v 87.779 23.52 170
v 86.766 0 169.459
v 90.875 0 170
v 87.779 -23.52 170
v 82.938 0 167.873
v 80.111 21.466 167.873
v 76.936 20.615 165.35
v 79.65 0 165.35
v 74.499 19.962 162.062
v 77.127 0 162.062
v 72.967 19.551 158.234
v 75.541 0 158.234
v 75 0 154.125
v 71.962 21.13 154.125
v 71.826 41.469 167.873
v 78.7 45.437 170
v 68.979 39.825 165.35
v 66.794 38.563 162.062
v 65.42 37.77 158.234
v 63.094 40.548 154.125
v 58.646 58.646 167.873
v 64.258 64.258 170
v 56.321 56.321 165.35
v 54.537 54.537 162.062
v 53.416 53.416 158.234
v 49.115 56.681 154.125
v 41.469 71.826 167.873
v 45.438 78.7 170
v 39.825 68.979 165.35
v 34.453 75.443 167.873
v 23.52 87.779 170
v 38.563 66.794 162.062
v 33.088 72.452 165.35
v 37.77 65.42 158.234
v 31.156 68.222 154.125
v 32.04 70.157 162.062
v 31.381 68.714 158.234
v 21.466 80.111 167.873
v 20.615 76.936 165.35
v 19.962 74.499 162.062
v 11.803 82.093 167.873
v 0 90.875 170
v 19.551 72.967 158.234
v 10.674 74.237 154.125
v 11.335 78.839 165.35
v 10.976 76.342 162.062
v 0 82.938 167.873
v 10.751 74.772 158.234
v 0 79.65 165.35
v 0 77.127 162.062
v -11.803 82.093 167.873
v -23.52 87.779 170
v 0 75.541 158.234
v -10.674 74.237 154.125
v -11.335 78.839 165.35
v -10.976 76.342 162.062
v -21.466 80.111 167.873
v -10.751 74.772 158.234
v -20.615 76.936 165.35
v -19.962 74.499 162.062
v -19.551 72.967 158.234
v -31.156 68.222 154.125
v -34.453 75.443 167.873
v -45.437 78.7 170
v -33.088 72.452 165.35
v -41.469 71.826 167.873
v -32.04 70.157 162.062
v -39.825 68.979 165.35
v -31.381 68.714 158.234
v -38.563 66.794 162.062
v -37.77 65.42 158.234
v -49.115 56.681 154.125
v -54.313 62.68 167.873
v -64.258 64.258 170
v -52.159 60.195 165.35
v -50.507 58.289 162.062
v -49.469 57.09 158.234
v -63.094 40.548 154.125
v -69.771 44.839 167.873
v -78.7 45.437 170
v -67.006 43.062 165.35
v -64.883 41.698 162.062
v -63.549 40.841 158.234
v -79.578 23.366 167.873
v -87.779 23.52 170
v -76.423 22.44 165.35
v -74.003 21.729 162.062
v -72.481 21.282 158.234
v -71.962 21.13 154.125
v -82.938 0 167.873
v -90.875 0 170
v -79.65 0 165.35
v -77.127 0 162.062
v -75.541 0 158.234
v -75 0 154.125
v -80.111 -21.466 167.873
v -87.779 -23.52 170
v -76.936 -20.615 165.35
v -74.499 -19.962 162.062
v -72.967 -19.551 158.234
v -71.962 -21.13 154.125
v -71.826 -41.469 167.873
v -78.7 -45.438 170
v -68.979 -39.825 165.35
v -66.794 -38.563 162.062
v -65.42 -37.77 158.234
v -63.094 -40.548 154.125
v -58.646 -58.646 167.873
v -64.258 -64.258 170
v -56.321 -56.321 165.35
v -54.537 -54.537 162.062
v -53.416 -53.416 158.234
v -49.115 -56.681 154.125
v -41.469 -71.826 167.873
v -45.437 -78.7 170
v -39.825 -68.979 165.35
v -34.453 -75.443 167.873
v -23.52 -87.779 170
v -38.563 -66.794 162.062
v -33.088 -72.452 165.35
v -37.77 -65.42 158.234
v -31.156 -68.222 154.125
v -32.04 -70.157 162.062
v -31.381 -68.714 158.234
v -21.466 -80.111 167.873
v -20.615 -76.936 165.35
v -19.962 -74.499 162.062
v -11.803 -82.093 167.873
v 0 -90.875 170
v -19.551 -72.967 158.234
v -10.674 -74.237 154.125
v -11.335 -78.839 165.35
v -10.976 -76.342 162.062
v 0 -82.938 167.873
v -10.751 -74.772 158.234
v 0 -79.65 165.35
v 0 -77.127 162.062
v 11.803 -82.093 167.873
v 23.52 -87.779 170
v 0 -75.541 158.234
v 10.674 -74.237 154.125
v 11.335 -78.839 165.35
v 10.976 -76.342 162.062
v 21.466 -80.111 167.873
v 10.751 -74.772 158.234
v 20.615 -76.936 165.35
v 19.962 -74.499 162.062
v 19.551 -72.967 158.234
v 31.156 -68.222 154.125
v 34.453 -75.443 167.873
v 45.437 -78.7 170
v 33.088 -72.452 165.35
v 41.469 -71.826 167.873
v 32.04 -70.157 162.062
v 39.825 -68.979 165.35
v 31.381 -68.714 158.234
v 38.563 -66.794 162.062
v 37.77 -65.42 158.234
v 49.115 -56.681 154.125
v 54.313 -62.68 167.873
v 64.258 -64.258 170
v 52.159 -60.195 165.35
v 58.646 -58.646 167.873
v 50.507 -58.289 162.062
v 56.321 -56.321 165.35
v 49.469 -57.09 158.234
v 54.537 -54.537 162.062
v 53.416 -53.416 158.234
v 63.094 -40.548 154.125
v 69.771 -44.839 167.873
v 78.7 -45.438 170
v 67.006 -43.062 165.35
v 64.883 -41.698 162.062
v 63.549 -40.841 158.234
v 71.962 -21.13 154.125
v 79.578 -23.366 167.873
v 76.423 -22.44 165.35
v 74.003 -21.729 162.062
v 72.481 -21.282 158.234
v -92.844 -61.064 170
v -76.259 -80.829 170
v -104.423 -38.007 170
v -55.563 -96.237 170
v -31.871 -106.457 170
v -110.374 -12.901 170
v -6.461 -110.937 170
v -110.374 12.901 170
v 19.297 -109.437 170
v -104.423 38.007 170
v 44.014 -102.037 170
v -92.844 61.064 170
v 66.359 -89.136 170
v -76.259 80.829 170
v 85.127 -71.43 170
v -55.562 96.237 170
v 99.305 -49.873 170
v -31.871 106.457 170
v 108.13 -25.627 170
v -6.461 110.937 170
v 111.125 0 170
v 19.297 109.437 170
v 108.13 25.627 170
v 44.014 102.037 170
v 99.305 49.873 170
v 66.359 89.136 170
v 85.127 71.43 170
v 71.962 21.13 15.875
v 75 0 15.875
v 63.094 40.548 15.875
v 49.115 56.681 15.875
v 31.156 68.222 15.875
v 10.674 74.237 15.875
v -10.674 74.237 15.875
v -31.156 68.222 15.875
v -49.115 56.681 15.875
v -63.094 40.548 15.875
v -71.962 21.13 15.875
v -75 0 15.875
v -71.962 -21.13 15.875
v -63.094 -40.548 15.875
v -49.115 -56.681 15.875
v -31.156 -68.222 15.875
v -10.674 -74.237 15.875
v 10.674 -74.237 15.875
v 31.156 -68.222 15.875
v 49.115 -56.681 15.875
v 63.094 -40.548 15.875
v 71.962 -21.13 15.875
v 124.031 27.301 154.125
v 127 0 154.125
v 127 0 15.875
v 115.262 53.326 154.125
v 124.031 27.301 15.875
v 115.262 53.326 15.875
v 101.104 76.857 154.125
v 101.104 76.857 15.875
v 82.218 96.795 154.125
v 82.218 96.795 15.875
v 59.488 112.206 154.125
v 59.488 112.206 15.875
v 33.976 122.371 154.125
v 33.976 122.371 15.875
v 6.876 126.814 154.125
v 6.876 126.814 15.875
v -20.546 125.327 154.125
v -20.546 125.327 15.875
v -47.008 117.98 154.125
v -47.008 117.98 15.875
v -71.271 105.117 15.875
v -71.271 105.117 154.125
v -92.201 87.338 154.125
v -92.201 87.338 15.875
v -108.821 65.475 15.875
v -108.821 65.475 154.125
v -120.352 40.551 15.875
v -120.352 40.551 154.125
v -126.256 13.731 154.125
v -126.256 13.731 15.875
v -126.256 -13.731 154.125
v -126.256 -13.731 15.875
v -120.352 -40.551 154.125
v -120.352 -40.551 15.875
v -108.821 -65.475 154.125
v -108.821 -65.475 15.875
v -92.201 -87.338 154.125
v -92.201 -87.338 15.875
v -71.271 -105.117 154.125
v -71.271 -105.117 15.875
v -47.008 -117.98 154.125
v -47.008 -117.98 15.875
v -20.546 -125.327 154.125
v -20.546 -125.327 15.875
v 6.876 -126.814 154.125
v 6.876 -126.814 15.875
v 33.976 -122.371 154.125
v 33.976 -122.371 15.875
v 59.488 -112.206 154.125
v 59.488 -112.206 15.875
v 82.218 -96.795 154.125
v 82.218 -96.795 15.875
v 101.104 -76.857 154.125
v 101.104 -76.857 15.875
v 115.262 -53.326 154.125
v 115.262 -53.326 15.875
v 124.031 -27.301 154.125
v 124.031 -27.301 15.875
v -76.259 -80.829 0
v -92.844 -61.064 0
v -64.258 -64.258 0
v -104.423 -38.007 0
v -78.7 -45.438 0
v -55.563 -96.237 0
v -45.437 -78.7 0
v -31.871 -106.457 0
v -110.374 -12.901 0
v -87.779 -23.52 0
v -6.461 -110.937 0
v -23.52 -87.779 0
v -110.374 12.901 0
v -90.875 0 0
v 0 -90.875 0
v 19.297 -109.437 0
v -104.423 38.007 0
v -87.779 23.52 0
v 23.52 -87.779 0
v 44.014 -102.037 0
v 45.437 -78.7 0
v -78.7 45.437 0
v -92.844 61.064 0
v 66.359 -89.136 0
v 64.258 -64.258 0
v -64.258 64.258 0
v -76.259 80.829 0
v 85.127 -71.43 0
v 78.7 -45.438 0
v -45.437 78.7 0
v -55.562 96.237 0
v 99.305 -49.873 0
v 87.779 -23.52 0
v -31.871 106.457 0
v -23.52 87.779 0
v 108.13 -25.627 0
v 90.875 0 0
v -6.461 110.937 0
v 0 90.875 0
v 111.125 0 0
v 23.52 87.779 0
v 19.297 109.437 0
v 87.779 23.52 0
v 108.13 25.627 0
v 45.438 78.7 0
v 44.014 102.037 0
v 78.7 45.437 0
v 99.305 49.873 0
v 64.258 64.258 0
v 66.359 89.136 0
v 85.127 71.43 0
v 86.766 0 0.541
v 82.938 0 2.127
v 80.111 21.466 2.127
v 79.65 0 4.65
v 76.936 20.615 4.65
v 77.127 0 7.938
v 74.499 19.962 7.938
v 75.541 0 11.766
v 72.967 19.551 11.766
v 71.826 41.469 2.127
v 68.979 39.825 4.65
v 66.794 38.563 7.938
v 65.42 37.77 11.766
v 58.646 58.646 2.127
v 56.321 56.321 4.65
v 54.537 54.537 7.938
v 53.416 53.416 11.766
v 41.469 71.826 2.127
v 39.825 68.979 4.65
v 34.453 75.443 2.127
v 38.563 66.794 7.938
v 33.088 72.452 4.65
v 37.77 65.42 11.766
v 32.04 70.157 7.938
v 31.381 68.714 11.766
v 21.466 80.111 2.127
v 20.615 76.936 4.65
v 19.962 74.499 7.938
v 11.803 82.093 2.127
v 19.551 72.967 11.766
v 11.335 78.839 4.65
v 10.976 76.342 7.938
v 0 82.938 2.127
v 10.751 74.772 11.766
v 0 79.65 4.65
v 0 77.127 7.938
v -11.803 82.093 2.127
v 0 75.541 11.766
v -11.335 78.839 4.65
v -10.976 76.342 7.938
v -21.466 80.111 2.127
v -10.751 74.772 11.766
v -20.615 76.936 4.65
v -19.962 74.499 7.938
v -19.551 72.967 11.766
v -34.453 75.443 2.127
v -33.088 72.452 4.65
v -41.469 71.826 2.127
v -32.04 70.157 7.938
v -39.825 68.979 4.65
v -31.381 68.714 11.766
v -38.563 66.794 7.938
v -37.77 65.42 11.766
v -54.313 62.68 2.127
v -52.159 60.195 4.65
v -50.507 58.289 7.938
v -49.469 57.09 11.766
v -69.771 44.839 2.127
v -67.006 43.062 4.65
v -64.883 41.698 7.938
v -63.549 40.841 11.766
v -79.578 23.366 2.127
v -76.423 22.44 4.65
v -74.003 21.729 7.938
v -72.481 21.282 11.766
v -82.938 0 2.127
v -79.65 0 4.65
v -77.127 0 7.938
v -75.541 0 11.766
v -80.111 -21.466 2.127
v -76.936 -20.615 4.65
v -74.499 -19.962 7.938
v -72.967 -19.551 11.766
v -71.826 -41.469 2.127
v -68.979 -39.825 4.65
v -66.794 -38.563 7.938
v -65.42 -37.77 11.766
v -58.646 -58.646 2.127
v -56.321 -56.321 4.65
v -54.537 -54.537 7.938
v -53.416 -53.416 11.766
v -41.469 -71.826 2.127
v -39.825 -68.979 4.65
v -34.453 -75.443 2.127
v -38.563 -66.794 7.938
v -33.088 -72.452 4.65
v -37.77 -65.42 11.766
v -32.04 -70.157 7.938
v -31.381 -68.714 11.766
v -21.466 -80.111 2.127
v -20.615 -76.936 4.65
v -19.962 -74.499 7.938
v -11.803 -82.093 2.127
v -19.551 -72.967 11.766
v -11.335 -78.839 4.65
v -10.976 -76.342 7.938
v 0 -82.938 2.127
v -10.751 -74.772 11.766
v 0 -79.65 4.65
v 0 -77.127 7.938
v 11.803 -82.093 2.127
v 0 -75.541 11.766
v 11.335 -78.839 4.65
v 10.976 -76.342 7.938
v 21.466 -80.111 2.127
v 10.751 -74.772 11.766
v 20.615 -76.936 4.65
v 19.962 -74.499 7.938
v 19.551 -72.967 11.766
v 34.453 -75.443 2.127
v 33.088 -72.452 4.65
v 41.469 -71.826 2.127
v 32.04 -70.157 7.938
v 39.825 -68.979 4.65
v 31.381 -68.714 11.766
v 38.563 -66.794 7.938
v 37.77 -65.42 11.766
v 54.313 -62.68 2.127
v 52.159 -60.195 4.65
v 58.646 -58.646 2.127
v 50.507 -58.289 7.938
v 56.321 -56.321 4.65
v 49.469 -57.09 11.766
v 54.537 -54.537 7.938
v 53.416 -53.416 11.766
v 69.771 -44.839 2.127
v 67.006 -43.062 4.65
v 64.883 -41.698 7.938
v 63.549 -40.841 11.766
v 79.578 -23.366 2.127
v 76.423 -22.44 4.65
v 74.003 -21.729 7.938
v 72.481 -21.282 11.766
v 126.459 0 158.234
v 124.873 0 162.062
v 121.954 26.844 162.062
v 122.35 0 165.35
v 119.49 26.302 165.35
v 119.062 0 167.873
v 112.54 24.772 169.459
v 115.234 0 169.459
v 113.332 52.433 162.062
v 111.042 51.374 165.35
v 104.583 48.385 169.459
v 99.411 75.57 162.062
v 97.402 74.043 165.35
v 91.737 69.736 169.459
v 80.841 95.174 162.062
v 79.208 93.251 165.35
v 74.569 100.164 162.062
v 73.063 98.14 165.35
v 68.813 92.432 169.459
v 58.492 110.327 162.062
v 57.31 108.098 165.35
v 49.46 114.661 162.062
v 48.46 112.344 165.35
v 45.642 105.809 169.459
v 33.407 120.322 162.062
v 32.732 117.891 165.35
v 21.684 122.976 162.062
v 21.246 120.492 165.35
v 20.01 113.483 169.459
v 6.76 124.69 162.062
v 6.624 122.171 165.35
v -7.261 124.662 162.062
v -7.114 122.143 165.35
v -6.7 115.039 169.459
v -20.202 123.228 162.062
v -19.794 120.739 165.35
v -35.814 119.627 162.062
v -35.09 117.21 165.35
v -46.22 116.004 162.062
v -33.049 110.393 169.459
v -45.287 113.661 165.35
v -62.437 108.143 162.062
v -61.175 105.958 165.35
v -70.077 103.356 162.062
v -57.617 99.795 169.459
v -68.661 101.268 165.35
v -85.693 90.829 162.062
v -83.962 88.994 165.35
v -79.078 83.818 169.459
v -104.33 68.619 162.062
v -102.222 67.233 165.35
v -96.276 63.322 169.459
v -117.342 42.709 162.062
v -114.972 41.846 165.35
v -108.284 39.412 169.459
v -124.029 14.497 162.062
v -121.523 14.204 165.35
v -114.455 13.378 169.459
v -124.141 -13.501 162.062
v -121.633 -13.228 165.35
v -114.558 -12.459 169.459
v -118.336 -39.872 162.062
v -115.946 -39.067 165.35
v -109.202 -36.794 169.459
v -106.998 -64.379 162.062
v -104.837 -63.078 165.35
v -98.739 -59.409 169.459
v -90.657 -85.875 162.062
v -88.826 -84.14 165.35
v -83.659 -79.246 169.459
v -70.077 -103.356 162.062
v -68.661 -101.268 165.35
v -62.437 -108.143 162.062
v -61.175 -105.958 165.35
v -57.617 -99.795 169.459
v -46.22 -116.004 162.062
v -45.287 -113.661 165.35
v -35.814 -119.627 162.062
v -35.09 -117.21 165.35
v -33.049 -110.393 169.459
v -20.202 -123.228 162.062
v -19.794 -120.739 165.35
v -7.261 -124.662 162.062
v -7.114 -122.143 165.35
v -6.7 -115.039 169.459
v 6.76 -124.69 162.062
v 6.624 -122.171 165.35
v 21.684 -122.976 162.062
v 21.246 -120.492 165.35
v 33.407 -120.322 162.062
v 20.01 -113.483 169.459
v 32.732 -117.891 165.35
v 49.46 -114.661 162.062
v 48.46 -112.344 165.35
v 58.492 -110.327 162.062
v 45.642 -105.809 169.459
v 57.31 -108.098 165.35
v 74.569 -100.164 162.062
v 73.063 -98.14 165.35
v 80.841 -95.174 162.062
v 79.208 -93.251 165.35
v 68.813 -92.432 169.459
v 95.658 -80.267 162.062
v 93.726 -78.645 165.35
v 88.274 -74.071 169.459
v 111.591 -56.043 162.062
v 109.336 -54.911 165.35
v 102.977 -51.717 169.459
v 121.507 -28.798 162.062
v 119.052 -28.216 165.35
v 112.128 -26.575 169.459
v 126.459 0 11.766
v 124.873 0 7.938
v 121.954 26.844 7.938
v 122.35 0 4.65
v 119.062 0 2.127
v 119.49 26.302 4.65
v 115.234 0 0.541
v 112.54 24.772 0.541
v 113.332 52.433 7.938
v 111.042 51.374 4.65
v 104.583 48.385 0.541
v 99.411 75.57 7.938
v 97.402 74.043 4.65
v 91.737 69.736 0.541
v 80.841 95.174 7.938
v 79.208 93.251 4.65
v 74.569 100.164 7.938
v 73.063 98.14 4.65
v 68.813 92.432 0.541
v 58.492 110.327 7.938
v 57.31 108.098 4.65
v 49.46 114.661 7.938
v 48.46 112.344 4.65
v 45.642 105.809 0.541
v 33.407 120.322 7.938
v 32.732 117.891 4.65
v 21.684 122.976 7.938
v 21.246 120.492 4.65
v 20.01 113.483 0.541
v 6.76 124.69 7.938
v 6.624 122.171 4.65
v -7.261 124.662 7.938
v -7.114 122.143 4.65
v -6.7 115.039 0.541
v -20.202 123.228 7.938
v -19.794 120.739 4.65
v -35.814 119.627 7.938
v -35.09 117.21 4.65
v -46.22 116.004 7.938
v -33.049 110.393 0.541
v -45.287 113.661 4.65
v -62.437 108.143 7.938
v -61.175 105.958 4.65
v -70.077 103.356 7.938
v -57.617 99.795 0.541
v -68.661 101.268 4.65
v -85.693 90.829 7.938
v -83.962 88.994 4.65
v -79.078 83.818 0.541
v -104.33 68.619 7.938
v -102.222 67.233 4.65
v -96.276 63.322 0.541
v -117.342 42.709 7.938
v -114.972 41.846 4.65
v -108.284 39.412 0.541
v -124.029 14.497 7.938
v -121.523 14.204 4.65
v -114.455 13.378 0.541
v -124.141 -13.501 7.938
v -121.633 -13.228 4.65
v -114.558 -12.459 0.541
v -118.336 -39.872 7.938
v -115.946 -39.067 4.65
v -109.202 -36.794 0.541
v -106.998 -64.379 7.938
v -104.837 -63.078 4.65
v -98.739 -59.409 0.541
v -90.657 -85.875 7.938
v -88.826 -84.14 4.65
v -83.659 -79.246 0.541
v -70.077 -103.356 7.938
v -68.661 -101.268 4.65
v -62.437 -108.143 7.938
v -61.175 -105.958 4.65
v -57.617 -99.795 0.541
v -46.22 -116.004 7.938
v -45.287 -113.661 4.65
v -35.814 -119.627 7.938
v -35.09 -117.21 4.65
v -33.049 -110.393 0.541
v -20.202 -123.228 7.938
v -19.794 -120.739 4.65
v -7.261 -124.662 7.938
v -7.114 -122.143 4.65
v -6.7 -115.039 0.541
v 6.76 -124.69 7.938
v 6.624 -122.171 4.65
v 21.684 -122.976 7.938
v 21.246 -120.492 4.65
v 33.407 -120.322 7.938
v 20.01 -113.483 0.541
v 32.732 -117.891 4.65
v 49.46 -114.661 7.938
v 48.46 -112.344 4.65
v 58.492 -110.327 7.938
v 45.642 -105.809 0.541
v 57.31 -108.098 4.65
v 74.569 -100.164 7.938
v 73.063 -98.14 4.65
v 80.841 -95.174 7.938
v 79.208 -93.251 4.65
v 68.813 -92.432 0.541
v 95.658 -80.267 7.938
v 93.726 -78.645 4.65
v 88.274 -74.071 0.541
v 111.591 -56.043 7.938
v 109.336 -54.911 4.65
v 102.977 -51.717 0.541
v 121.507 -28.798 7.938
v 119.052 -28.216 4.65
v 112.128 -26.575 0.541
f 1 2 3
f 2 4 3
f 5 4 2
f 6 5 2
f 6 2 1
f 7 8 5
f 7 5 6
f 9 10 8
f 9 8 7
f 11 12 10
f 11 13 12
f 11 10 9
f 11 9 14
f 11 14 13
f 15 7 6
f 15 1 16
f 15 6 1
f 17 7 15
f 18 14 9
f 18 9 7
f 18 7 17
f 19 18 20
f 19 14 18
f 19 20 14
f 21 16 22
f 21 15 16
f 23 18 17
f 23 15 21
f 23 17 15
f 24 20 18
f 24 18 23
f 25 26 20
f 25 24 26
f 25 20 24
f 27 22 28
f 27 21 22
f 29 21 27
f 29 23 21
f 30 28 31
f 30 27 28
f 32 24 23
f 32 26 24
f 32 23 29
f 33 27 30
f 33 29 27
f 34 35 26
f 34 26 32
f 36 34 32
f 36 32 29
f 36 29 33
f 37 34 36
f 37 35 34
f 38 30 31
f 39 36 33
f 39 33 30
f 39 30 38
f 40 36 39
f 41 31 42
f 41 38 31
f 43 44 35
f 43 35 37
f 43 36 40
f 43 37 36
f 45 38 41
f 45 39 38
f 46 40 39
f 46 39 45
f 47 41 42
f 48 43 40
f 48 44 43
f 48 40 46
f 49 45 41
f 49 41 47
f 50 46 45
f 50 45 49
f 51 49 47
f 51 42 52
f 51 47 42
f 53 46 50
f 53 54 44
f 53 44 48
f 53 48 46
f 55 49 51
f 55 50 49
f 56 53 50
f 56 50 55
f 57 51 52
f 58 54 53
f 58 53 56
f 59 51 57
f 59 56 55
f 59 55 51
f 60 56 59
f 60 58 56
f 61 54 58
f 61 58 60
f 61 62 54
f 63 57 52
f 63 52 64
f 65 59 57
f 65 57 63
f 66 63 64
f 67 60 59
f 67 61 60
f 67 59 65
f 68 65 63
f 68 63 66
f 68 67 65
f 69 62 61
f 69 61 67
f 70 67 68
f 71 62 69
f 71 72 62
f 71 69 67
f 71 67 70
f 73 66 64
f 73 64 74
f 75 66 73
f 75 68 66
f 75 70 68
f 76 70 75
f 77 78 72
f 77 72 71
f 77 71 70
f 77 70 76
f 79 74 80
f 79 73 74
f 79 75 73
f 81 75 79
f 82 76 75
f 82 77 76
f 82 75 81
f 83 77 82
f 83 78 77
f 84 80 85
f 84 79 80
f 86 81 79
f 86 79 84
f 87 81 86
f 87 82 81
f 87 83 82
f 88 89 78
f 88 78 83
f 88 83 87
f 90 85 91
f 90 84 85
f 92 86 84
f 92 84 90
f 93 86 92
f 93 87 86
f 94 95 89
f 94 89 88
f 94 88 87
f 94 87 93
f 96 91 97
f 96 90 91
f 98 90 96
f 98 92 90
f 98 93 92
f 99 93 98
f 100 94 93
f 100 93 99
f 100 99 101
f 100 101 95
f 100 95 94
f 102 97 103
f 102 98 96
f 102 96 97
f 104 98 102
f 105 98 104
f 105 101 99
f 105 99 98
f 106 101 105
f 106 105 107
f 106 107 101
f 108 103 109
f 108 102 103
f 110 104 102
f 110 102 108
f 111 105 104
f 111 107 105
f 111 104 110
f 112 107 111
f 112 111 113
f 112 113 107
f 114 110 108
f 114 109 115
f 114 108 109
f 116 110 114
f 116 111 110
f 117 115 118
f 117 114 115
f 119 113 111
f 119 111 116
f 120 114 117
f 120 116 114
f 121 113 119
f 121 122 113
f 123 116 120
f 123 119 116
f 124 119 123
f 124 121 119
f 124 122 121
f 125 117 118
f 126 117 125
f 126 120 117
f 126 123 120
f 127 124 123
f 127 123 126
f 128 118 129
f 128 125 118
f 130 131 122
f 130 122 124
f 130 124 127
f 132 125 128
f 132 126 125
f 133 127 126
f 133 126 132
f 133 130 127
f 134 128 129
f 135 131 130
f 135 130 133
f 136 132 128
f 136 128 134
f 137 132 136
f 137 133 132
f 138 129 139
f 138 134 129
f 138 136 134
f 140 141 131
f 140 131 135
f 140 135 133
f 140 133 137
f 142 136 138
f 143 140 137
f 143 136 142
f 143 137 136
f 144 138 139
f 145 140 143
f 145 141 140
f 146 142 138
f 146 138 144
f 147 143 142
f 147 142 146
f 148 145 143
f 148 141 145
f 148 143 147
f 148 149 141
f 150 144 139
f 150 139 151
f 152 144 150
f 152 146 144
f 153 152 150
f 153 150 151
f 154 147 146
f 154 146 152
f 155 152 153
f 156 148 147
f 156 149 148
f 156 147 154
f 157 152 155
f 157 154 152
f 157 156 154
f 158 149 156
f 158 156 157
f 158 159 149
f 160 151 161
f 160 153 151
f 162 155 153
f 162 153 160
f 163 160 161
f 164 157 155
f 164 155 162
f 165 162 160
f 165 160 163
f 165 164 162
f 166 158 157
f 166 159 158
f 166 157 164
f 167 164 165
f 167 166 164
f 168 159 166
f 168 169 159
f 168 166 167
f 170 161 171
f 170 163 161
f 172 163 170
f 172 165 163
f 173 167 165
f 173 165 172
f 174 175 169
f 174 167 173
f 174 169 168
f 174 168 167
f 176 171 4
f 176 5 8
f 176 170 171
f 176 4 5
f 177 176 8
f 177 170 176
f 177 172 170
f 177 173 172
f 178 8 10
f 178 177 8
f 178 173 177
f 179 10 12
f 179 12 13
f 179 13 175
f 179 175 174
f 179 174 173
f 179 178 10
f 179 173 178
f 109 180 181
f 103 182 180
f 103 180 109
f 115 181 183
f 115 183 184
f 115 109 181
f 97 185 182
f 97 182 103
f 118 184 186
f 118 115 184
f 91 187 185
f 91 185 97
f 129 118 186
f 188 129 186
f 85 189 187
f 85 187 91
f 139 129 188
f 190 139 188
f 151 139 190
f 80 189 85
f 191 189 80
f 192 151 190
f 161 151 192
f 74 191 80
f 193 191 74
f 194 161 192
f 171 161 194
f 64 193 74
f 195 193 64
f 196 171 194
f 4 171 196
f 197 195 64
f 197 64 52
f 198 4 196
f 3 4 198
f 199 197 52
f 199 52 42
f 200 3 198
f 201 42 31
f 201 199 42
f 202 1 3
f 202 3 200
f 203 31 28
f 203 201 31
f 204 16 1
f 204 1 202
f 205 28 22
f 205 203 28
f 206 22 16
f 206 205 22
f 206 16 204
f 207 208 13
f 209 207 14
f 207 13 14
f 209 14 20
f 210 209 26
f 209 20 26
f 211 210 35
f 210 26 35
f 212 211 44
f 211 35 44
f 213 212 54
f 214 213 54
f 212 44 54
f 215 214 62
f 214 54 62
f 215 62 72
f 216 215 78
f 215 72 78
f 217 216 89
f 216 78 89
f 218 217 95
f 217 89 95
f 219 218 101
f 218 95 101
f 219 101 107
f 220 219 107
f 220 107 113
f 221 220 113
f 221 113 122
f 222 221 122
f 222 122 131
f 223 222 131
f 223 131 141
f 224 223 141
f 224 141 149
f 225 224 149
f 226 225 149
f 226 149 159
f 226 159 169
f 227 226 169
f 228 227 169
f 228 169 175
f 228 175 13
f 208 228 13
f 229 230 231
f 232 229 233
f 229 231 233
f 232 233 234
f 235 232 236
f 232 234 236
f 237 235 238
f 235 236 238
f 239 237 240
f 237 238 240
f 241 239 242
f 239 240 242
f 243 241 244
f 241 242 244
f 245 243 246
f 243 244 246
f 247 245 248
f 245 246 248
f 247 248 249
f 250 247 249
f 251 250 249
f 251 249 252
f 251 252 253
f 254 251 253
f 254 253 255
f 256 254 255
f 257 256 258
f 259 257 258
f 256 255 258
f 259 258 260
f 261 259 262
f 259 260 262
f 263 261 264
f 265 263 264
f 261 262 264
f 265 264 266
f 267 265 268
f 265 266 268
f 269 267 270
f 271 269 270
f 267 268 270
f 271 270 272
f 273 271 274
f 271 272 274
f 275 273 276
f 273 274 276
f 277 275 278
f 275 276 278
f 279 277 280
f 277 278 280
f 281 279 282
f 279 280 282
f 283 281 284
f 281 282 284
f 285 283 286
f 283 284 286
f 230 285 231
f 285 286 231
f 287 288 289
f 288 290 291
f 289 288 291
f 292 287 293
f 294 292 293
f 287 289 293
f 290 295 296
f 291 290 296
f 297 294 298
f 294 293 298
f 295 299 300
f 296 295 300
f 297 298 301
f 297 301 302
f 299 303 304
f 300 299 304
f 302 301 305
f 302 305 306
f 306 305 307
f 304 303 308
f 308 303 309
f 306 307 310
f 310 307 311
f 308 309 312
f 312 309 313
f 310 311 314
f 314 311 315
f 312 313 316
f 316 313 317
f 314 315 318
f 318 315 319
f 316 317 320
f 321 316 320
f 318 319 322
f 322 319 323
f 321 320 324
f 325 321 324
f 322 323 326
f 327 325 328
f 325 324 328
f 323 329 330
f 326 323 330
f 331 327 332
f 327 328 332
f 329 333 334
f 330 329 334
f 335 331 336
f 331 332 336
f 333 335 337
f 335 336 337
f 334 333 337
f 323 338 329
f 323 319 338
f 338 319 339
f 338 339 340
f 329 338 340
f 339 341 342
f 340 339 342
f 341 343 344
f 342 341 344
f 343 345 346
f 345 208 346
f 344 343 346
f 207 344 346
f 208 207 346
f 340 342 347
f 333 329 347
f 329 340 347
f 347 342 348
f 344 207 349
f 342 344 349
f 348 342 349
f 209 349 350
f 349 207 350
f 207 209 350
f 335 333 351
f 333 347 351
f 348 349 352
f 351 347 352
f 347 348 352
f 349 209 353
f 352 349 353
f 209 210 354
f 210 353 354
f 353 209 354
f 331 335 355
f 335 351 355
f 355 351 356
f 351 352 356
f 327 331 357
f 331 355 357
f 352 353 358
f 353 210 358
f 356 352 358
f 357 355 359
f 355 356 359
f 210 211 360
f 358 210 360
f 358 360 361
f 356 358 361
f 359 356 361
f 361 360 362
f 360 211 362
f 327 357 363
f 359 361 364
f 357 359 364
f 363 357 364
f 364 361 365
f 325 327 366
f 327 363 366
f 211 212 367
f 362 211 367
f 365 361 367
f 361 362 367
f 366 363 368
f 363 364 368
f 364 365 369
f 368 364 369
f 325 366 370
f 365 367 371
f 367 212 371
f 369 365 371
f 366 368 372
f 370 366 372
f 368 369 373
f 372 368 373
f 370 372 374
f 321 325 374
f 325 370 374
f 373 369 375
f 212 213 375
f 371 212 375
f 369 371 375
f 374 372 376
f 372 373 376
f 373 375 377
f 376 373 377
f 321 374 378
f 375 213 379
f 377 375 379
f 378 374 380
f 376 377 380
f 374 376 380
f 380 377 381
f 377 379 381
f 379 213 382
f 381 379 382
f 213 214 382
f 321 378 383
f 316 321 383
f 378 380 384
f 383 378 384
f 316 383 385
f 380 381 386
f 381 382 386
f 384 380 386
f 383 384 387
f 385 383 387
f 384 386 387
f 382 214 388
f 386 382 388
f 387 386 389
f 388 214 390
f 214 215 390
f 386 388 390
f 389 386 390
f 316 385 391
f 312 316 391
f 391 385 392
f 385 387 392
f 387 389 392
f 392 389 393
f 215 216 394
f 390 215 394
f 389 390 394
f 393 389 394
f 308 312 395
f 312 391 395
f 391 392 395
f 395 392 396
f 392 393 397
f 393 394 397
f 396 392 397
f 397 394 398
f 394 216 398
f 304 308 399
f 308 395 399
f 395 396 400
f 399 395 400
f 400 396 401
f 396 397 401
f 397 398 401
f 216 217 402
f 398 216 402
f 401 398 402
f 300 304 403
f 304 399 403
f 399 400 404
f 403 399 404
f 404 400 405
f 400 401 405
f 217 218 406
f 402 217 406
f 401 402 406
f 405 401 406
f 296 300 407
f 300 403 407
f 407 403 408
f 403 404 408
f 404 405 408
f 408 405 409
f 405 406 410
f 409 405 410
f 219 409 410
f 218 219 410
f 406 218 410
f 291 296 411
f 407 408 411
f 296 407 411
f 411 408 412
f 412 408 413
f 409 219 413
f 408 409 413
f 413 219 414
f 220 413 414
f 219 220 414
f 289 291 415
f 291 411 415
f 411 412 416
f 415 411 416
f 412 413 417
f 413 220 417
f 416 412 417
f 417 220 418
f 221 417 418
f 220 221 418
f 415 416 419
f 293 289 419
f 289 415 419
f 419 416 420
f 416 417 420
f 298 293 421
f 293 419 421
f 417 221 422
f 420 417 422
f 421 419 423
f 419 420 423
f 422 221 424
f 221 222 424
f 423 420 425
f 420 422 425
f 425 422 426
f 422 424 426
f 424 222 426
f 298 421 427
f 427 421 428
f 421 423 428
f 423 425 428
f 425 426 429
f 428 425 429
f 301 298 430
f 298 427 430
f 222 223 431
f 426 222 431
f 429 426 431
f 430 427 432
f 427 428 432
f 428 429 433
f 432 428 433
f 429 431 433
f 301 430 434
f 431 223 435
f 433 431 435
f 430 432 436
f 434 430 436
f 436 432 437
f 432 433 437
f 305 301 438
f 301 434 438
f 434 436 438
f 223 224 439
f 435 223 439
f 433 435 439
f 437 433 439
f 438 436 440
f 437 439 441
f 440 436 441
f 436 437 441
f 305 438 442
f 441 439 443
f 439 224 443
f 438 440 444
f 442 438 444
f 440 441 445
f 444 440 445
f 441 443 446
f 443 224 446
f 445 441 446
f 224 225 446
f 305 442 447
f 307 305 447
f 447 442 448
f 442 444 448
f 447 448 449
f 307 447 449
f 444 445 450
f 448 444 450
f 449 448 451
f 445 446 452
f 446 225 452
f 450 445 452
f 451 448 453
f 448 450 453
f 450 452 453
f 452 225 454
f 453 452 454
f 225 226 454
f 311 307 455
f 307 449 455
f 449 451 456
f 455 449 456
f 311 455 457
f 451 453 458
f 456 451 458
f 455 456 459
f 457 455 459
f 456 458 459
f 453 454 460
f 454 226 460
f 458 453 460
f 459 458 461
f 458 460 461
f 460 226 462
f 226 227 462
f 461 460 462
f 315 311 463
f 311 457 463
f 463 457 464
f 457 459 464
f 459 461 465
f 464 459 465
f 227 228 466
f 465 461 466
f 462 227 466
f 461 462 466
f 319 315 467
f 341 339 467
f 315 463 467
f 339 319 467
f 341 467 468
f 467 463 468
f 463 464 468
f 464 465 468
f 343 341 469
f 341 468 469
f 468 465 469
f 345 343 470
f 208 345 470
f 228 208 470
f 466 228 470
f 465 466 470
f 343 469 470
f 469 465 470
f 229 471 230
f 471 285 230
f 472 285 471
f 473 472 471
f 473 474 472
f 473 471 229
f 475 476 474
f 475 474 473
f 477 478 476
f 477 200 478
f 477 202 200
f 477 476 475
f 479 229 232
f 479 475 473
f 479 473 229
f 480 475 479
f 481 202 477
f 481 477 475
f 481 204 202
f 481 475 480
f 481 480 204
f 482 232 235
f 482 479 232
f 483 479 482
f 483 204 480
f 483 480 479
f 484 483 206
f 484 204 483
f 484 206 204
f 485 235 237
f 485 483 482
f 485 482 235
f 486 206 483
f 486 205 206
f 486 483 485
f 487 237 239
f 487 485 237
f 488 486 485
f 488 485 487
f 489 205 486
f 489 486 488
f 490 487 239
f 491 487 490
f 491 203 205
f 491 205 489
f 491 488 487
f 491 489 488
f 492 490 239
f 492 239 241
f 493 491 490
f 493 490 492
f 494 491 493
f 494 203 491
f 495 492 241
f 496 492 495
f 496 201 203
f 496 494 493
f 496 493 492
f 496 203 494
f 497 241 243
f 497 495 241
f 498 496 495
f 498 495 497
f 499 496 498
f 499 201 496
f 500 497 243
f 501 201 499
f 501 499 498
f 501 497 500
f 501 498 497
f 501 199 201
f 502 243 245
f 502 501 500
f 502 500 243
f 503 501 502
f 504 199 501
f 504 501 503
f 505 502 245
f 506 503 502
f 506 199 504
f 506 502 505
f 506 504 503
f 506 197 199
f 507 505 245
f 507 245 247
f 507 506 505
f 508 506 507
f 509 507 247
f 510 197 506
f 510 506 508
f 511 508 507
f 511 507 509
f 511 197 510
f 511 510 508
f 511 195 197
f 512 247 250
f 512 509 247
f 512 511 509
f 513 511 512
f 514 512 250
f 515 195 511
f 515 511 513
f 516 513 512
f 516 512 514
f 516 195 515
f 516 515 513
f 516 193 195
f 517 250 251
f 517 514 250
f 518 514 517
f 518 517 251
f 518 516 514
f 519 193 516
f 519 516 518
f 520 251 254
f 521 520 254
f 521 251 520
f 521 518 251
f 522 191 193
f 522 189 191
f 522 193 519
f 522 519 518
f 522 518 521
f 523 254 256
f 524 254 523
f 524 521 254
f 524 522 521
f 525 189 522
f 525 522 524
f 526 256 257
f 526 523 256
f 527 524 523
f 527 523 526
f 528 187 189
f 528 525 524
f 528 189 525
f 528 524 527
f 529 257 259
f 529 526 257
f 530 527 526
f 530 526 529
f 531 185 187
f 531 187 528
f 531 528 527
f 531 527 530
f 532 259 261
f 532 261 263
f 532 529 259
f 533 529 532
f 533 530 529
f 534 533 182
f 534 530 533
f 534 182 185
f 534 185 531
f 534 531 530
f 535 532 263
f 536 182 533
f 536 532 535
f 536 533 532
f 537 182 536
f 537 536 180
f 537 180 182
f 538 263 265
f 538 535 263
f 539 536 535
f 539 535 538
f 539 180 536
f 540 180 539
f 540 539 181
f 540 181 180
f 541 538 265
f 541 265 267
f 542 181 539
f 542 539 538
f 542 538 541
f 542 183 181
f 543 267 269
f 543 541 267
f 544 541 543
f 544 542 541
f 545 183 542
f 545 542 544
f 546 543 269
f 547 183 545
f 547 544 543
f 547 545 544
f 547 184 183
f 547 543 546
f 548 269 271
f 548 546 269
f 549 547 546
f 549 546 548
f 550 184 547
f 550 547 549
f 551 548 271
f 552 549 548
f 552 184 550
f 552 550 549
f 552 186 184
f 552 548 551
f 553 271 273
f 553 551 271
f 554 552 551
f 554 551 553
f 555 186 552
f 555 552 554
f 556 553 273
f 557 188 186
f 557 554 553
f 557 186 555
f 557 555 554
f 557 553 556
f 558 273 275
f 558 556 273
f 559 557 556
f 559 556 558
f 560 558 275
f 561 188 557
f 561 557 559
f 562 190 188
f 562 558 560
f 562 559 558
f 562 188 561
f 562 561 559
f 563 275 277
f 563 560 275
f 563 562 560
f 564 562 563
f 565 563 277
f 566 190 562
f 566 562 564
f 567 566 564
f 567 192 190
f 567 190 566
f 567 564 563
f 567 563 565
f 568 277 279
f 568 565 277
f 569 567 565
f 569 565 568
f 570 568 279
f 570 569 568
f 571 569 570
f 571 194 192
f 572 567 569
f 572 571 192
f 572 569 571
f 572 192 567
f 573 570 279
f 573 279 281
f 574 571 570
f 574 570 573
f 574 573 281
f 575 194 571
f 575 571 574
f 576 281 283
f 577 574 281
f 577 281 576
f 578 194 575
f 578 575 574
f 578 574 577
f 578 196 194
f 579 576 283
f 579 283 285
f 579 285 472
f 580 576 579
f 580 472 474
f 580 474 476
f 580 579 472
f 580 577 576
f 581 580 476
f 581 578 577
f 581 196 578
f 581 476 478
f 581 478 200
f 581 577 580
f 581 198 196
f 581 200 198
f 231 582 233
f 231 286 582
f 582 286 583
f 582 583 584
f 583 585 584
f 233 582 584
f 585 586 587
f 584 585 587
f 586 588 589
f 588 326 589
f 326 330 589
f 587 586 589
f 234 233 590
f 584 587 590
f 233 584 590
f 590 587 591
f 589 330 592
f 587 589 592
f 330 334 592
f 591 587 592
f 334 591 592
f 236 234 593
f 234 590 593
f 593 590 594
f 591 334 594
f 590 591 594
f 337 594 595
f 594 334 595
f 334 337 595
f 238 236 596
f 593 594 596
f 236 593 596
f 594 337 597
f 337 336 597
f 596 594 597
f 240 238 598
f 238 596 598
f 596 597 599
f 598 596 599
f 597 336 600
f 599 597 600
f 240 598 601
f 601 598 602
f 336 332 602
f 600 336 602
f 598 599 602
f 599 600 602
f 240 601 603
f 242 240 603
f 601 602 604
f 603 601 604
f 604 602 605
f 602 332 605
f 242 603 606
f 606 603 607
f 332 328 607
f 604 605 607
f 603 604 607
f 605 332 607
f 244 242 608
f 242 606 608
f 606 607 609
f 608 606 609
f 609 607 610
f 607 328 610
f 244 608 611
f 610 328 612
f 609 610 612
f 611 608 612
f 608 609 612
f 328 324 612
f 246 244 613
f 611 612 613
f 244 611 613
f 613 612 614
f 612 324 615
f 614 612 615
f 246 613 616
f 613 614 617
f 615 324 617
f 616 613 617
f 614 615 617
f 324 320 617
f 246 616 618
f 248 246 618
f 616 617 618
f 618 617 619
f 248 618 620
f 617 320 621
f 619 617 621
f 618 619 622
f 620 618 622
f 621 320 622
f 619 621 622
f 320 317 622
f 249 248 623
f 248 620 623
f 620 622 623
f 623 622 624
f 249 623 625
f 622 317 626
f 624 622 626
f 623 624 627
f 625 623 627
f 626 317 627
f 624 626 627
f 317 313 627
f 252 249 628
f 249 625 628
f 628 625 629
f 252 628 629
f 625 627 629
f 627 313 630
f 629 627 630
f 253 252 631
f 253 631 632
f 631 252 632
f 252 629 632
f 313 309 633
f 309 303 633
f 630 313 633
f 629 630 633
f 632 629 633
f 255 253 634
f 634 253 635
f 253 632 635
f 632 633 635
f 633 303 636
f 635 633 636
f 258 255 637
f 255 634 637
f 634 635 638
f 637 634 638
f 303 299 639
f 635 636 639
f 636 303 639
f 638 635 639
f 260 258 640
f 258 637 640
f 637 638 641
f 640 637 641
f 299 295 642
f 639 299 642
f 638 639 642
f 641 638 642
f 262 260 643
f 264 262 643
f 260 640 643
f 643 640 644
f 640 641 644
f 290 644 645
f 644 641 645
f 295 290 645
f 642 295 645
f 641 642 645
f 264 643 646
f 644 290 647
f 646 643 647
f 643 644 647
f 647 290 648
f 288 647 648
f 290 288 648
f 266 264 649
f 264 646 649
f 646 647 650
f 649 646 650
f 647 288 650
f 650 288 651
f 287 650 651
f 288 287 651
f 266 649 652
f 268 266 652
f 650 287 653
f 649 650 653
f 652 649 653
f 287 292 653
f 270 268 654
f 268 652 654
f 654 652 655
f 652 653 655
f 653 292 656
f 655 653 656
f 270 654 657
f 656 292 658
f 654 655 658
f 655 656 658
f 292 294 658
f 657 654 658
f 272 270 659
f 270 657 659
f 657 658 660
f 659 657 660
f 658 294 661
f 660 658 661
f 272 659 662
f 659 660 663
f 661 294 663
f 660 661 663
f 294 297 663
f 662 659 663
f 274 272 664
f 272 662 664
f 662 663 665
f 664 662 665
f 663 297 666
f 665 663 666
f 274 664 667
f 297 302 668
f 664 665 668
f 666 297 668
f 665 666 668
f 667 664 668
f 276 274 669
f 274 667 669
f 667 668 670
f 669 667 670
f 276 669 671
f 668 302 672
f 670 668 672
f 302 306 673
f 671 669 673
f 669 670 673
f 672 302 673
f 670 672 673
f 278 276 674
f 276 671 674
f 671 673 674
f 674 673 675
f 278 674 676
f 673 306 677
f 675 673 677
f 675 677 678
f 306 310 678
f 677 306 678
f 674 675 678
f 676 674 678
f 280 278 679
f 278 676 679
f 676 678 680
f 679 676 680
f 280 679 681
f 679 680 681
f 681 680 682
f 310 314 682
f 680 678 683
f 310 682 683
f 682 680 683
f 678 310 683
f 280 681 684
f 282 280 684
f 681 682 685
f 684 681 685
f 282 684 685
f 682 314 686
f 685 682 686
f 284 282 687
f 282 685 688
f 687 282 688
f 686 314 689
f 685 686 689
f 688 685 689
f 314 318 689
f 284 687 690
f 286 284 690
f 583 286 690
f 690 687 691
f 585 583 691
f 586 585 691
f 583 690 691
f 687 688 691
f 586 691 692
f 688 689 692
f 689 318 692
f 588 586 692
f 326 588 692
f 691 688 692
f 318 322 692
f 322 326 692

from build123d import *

# Parameters (mm, degrees)
SKETCH1_R           = 127
BOSS_EXTRUDE1_DEPTH = 170
SKETCH2_R           = 75
CUT_EXTRUDE1_DEPTH  = 171
FILLET1_R           = 15.875


with BuildPart() as part:
    # Sketch1 → Boss-Extrude1 (new body)
    with BuildSketch(Plane.XY):
        Circle(SKETCH1_R)
    extrude(amount=BOSS_EXTRUDE1_DEPTH)

    # Sketch2 → Cut-Extrude1 (cut, through all)
    with BuildSketch(Plane.XY.offset(170)):
        Circle(SKETCH2_R)
    extrude(amount=-CUT_EXTRUDE1_DEPTH, mode=Mode.SUBTRACT)

    # Fillet1
    fillet1_edges = [part.edges().sort_by_distance(p)[0] for p in [
        (-127, 0, 0),
        (-127, 0, 170),
        (-75, 0, 0),
        (-75, 0, 170),
    ]]
    fillet(fillet1_edges, radius=FILLET1_R)


solid = part.part
